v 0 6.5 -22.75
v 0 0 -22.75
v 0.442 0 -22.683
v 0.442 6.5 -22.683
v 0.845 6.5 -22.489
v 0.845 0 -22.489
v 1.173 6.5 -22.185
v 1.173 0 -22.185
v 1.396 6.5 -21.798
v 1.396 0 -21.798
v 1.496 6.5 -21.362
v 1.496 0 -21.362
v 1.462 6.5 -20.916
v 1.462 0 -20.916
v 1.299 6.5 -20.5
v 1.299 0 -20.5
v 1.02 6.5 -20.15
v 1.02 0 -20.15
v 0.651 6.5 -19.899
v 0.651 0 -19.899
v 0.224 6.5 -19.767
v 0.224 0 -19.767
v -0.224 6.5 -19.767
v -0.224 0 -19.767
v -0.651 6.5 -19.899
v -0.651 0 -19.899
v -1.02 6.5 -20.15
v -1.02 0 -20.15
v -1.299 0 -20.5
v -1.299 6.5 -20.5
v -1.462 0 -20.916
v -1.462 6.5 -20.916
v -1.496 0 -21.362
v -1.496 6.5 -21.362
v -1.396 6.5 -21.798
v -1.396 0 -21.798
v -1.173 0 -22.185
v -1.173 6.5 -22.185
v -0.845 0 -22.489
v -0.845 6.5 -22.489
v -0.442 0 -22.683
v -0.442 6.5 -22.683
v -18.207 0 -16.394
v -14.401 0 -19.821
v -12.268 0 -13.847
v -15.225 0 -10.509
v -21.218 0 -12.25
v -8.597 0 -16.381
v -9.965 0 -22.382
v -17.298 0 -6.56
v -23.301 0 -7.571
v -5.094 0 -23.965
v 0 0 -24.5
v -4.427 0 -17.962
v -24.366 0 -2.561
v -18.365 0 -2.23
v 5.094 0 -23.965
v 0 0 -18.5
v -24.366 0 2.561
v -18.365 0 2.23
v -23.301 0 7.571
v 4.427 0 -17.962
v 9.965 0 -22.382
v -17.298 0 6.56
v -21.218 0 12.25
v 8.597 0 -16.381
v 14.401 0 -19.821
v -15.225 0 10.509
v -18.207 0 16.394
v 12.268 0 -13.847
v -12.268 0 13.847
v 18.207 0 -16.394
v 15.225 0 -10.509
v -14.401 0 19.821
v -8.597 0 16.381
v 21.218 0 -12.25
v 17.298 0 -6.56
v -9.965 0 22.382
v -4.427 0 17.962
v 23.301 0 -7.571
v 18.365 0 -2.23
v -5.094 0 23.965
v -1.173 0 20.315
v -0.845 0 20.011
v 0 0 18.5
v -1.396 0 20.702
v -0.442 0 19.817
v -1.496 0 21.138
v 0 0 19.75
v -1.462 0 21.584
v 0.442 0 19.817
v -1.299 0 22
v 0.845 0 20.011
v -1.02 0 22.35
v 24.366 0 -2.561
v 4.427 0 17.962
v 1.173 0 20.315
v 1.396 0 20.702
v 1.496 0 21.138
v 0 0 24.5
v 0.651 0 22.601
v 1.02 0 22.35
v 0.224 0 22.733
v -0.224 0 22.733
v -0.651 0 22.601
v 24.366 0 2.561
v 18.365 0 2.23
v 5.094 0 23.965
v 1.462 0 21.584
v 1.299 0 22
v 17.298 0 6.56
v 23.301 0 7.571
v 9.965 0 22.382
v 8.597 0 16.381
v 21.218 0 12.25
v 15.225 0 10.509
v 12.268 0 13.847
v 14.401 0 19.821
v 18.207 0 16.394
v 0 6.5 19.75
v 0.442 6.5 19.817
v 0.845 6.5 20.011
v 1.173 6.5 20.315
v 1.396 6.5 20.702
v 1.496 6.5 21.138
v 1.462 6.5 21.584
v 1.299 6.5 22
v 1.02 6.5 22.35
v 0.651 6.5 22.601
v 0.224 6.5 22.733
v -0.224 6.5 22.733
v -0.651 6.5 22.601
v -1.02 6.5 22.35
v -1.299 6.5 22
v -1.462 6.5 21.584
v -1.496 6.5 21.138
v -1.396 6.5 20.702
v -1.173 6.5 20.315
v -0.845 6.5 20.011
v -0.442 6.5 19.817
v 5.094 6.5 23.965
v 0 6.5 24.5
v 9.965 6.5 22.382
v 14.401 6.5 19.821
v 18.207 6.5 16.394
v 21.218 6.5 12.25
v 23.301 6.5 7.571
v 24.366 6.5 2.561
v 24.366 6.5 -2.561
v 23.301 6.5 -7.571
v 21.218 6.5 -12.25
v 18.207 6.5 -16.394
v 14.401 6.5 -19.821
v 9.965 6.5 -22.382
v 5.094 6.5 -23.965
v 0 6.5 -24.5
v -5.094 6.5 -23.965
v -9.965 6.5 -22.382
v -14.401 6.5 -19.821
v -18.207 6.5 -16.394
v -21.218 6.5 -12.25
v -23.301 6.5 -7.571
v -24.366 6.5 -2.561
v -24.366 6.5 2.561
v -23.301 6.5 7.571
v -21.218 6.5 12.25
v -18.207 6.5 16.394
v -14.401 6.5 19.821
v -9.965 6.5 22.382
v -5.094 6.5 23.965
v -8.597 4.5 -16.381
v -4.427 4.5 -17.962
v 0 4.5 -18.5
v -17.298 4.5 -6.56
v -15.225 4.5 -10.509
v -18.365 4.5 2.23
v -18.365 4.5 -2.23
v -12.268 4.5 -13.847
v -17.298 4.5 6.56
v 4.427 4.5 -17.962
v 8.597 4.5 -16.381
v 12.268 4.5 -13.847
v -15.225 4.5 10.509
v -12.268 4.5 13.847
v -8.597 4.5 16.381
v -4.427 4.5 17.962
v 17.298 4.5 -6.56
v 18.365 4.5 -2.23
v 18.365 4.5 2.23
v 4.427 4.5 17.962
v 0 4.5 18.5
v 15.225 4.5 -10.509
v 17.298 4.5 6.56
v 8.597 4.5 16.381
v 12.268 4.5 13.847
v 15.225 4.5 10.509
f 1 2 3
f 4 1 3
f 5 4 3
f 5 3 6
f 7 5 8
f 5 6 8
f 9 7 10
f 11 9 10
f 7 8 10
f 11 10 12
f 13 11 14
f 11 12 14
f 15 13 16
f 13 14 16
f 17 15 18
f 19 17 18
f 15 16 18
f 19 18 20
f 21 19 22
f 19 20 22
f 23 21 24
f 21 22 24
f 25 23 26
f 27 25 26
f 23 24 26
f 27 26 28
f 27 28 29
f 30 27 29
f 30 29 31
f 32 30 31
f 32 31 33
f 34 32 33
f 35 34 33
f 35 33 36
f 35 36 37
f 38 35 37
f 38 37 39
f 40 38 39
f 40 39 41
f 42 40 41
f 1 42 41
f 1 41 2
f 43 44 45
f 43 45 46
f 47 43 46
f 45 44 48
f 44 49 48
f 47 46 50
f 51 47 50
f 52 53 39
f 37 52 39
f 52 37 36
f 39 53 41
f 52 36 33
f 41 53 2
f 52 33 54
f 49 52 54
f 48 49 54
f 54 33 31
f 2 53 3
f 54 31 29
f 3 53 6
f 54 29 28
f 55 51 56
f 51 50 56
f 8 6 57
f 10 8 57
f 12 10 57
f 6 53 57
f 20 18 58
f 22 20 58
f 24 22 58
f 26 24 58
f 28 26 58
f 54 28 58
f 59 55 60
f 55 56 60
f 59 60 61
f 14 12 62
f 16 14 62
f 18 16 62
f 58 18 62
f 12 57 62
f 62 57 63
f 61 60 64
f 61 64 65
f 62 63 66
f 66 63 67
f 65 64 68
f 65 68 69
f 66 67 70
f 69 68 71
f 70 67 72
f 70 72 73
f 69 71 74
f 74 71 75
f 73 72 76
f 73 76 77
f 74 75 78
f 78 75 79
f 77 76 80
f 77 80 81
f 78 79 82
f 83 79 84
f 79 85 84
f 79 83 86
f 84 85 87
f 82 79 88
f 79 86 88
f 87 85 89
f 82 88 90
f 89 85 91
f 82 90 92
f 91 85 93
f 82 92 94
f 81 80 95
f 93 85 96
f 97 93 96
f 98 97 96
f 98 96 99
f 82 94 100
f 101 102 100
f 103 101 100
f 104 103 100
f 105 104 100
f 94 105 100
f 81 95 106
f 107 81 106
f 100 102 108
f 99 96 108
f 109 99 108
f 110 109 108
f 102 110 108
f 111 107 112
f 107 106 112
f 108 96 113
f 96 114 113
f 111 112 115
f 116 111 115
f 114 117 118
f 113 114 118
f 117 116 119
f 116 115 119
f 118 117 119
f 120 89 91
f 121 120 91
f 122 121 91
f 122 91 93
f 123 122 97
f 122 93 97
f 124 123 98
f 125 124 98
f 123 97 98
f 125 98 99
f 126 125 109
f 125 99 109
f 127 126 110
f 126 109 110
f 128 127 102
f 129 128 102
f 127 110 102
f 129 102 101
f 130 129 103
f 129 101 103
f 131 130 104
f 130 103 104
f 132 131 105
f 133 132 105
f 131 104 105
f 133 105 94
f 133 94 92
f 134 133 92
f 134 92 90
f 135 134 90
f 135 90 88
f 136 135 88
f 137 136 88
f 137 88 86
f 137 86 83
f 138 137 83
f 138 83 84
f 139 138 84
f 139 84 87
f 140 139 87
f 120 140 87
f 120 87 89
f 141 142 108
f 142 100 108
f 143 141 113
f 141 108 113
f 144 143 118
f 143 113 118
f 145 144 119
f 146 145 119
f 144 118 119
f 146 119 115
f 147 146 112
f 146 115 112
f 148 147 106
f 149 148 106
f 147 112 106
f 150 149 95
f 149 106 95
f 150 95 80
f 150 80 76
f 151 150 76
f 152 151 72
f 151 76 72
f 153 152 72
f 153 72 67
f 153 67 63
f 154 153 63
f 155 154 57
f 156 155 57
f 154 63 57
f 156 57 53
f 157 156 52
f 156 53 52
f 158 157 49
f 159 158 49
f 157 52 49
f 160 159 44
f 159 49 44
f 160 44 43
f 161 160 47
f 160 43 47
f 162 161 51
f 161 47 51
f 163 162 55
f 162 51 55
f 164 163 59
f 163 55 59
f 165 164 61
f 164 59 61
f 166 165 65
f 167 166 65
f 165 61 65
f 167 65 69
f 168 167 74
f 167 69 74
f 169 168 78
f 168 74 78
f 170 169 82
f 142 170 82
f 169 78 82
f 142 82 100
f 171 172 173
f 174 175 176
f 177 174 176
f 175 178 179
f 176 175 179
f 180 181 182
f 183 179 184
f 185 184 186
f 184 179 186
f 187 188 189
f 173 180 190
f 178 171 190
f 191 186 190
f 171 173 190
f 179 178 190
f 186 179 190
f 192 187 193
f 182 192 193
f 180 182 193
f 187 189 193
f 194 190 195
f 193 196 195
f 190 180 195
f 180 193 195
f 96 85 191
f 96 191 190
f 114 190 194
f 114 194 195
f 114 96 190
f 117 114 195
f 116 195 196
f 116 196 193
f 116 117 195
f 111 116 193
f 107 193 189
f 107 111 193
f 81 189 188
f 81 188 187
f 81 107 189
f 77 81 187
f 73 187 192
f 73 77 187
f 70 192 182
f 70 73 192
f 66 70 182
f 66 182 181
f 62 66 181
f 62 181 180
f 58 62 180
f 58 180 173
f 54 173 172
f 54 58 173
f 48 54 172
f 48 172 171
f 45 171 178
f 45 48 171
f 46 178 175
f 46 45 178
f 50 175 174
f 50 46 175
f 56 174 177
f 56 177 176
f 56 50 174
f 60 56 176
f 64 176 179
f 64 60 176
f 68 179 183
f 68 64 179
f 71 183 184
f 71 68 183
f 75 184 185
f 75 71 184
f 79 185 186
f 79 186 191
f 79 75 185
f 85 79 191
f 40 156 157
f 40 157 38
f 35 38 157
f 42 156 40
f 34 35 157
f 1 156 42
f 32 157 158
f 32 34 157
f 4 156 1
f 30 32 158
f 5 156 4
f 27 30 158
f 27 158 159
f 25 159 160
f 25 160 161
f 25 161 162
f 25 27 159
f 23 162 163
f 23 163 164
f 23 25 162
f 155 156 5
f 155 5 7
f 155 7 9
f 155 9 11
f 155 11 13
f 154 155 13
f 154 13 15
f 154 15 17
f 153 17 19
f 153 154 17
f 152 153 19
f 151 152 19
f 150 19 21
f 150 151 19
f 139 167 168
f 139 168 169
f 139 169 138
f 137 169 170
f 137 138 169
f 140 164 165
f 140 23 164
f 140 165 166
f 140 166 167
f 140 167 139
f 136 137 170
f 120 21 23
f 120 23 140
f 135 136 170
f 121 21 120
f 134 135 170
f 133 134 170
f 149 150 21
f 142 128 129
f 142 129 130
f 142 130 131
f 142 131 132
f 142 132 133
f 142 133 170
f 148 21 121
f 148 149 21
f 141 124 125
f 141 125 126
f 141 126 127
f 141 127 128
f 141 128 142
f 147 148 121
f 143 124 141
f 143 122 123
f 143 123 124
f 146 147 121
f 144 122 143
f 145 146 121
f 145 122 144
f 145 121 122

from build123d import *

# Parameters (mm, degrees)
SKETCH1_R           = 24.5
SKETCH1_R_2         = 18.5
BOSS_EXTRUDE1_DEPTH = 4.5
SKETCH2_R           = 24.5
BOSS_EXTRUDE2_DEPTH = 2
SKETCH3_R           = 1.5
CUT_EXTRUDE1_DEPTH  = 36.252659474


with BuildPart() as part:
    # Sketch1 → Boss-Extrude1 (new body)
    with BuildSketch(Plane(origin=(0, 0, 0), x_dir=(1, 0, 0), z_dir=(0, 1, 0))):
        with Locations(Location((0, 0, 0), (0, 0, 270))):
            Circle(SKETCH1_R)
        with Locations(Location((0, 0, 0), (0, 0, 270))):
            Circle(SKETCH1_R_2, mode=Mode.SUBTRACT)
    extrude(amount=BOSS_EXTRUDE1_DEPTH)

    # Sketch2 → Boss-Extrude2 (add)
    with BuildSketch(Plane(origin=(0, 4.5, 0), x_dir=(1, 0, 0), z_dir=(0, 1, 0))):
        with Locations(Location((0, 0, 0), (0, 0, 270))):
            Circle(SKETCH2_R)
    extrude(amount=BOSS_EXTRUDE2_DEPTH)

    # Sketch3 → Cut-Extrude1 (cut, through all)
    with BuildSketch(Plane.XZ):
        with Locations(Location((0, -21.25, 0), (0, 0, 270))):
            Circle(SKETCH3_R)
        with Locations(Location((0, 21.25, 0), (0, 0, 270))):
            Circle(SKETCH3_R)
    extrude(amount=-CUT_EXTRUDE1_DEPTH, mode=Mode.SUBTRACT)


solid = part.part
